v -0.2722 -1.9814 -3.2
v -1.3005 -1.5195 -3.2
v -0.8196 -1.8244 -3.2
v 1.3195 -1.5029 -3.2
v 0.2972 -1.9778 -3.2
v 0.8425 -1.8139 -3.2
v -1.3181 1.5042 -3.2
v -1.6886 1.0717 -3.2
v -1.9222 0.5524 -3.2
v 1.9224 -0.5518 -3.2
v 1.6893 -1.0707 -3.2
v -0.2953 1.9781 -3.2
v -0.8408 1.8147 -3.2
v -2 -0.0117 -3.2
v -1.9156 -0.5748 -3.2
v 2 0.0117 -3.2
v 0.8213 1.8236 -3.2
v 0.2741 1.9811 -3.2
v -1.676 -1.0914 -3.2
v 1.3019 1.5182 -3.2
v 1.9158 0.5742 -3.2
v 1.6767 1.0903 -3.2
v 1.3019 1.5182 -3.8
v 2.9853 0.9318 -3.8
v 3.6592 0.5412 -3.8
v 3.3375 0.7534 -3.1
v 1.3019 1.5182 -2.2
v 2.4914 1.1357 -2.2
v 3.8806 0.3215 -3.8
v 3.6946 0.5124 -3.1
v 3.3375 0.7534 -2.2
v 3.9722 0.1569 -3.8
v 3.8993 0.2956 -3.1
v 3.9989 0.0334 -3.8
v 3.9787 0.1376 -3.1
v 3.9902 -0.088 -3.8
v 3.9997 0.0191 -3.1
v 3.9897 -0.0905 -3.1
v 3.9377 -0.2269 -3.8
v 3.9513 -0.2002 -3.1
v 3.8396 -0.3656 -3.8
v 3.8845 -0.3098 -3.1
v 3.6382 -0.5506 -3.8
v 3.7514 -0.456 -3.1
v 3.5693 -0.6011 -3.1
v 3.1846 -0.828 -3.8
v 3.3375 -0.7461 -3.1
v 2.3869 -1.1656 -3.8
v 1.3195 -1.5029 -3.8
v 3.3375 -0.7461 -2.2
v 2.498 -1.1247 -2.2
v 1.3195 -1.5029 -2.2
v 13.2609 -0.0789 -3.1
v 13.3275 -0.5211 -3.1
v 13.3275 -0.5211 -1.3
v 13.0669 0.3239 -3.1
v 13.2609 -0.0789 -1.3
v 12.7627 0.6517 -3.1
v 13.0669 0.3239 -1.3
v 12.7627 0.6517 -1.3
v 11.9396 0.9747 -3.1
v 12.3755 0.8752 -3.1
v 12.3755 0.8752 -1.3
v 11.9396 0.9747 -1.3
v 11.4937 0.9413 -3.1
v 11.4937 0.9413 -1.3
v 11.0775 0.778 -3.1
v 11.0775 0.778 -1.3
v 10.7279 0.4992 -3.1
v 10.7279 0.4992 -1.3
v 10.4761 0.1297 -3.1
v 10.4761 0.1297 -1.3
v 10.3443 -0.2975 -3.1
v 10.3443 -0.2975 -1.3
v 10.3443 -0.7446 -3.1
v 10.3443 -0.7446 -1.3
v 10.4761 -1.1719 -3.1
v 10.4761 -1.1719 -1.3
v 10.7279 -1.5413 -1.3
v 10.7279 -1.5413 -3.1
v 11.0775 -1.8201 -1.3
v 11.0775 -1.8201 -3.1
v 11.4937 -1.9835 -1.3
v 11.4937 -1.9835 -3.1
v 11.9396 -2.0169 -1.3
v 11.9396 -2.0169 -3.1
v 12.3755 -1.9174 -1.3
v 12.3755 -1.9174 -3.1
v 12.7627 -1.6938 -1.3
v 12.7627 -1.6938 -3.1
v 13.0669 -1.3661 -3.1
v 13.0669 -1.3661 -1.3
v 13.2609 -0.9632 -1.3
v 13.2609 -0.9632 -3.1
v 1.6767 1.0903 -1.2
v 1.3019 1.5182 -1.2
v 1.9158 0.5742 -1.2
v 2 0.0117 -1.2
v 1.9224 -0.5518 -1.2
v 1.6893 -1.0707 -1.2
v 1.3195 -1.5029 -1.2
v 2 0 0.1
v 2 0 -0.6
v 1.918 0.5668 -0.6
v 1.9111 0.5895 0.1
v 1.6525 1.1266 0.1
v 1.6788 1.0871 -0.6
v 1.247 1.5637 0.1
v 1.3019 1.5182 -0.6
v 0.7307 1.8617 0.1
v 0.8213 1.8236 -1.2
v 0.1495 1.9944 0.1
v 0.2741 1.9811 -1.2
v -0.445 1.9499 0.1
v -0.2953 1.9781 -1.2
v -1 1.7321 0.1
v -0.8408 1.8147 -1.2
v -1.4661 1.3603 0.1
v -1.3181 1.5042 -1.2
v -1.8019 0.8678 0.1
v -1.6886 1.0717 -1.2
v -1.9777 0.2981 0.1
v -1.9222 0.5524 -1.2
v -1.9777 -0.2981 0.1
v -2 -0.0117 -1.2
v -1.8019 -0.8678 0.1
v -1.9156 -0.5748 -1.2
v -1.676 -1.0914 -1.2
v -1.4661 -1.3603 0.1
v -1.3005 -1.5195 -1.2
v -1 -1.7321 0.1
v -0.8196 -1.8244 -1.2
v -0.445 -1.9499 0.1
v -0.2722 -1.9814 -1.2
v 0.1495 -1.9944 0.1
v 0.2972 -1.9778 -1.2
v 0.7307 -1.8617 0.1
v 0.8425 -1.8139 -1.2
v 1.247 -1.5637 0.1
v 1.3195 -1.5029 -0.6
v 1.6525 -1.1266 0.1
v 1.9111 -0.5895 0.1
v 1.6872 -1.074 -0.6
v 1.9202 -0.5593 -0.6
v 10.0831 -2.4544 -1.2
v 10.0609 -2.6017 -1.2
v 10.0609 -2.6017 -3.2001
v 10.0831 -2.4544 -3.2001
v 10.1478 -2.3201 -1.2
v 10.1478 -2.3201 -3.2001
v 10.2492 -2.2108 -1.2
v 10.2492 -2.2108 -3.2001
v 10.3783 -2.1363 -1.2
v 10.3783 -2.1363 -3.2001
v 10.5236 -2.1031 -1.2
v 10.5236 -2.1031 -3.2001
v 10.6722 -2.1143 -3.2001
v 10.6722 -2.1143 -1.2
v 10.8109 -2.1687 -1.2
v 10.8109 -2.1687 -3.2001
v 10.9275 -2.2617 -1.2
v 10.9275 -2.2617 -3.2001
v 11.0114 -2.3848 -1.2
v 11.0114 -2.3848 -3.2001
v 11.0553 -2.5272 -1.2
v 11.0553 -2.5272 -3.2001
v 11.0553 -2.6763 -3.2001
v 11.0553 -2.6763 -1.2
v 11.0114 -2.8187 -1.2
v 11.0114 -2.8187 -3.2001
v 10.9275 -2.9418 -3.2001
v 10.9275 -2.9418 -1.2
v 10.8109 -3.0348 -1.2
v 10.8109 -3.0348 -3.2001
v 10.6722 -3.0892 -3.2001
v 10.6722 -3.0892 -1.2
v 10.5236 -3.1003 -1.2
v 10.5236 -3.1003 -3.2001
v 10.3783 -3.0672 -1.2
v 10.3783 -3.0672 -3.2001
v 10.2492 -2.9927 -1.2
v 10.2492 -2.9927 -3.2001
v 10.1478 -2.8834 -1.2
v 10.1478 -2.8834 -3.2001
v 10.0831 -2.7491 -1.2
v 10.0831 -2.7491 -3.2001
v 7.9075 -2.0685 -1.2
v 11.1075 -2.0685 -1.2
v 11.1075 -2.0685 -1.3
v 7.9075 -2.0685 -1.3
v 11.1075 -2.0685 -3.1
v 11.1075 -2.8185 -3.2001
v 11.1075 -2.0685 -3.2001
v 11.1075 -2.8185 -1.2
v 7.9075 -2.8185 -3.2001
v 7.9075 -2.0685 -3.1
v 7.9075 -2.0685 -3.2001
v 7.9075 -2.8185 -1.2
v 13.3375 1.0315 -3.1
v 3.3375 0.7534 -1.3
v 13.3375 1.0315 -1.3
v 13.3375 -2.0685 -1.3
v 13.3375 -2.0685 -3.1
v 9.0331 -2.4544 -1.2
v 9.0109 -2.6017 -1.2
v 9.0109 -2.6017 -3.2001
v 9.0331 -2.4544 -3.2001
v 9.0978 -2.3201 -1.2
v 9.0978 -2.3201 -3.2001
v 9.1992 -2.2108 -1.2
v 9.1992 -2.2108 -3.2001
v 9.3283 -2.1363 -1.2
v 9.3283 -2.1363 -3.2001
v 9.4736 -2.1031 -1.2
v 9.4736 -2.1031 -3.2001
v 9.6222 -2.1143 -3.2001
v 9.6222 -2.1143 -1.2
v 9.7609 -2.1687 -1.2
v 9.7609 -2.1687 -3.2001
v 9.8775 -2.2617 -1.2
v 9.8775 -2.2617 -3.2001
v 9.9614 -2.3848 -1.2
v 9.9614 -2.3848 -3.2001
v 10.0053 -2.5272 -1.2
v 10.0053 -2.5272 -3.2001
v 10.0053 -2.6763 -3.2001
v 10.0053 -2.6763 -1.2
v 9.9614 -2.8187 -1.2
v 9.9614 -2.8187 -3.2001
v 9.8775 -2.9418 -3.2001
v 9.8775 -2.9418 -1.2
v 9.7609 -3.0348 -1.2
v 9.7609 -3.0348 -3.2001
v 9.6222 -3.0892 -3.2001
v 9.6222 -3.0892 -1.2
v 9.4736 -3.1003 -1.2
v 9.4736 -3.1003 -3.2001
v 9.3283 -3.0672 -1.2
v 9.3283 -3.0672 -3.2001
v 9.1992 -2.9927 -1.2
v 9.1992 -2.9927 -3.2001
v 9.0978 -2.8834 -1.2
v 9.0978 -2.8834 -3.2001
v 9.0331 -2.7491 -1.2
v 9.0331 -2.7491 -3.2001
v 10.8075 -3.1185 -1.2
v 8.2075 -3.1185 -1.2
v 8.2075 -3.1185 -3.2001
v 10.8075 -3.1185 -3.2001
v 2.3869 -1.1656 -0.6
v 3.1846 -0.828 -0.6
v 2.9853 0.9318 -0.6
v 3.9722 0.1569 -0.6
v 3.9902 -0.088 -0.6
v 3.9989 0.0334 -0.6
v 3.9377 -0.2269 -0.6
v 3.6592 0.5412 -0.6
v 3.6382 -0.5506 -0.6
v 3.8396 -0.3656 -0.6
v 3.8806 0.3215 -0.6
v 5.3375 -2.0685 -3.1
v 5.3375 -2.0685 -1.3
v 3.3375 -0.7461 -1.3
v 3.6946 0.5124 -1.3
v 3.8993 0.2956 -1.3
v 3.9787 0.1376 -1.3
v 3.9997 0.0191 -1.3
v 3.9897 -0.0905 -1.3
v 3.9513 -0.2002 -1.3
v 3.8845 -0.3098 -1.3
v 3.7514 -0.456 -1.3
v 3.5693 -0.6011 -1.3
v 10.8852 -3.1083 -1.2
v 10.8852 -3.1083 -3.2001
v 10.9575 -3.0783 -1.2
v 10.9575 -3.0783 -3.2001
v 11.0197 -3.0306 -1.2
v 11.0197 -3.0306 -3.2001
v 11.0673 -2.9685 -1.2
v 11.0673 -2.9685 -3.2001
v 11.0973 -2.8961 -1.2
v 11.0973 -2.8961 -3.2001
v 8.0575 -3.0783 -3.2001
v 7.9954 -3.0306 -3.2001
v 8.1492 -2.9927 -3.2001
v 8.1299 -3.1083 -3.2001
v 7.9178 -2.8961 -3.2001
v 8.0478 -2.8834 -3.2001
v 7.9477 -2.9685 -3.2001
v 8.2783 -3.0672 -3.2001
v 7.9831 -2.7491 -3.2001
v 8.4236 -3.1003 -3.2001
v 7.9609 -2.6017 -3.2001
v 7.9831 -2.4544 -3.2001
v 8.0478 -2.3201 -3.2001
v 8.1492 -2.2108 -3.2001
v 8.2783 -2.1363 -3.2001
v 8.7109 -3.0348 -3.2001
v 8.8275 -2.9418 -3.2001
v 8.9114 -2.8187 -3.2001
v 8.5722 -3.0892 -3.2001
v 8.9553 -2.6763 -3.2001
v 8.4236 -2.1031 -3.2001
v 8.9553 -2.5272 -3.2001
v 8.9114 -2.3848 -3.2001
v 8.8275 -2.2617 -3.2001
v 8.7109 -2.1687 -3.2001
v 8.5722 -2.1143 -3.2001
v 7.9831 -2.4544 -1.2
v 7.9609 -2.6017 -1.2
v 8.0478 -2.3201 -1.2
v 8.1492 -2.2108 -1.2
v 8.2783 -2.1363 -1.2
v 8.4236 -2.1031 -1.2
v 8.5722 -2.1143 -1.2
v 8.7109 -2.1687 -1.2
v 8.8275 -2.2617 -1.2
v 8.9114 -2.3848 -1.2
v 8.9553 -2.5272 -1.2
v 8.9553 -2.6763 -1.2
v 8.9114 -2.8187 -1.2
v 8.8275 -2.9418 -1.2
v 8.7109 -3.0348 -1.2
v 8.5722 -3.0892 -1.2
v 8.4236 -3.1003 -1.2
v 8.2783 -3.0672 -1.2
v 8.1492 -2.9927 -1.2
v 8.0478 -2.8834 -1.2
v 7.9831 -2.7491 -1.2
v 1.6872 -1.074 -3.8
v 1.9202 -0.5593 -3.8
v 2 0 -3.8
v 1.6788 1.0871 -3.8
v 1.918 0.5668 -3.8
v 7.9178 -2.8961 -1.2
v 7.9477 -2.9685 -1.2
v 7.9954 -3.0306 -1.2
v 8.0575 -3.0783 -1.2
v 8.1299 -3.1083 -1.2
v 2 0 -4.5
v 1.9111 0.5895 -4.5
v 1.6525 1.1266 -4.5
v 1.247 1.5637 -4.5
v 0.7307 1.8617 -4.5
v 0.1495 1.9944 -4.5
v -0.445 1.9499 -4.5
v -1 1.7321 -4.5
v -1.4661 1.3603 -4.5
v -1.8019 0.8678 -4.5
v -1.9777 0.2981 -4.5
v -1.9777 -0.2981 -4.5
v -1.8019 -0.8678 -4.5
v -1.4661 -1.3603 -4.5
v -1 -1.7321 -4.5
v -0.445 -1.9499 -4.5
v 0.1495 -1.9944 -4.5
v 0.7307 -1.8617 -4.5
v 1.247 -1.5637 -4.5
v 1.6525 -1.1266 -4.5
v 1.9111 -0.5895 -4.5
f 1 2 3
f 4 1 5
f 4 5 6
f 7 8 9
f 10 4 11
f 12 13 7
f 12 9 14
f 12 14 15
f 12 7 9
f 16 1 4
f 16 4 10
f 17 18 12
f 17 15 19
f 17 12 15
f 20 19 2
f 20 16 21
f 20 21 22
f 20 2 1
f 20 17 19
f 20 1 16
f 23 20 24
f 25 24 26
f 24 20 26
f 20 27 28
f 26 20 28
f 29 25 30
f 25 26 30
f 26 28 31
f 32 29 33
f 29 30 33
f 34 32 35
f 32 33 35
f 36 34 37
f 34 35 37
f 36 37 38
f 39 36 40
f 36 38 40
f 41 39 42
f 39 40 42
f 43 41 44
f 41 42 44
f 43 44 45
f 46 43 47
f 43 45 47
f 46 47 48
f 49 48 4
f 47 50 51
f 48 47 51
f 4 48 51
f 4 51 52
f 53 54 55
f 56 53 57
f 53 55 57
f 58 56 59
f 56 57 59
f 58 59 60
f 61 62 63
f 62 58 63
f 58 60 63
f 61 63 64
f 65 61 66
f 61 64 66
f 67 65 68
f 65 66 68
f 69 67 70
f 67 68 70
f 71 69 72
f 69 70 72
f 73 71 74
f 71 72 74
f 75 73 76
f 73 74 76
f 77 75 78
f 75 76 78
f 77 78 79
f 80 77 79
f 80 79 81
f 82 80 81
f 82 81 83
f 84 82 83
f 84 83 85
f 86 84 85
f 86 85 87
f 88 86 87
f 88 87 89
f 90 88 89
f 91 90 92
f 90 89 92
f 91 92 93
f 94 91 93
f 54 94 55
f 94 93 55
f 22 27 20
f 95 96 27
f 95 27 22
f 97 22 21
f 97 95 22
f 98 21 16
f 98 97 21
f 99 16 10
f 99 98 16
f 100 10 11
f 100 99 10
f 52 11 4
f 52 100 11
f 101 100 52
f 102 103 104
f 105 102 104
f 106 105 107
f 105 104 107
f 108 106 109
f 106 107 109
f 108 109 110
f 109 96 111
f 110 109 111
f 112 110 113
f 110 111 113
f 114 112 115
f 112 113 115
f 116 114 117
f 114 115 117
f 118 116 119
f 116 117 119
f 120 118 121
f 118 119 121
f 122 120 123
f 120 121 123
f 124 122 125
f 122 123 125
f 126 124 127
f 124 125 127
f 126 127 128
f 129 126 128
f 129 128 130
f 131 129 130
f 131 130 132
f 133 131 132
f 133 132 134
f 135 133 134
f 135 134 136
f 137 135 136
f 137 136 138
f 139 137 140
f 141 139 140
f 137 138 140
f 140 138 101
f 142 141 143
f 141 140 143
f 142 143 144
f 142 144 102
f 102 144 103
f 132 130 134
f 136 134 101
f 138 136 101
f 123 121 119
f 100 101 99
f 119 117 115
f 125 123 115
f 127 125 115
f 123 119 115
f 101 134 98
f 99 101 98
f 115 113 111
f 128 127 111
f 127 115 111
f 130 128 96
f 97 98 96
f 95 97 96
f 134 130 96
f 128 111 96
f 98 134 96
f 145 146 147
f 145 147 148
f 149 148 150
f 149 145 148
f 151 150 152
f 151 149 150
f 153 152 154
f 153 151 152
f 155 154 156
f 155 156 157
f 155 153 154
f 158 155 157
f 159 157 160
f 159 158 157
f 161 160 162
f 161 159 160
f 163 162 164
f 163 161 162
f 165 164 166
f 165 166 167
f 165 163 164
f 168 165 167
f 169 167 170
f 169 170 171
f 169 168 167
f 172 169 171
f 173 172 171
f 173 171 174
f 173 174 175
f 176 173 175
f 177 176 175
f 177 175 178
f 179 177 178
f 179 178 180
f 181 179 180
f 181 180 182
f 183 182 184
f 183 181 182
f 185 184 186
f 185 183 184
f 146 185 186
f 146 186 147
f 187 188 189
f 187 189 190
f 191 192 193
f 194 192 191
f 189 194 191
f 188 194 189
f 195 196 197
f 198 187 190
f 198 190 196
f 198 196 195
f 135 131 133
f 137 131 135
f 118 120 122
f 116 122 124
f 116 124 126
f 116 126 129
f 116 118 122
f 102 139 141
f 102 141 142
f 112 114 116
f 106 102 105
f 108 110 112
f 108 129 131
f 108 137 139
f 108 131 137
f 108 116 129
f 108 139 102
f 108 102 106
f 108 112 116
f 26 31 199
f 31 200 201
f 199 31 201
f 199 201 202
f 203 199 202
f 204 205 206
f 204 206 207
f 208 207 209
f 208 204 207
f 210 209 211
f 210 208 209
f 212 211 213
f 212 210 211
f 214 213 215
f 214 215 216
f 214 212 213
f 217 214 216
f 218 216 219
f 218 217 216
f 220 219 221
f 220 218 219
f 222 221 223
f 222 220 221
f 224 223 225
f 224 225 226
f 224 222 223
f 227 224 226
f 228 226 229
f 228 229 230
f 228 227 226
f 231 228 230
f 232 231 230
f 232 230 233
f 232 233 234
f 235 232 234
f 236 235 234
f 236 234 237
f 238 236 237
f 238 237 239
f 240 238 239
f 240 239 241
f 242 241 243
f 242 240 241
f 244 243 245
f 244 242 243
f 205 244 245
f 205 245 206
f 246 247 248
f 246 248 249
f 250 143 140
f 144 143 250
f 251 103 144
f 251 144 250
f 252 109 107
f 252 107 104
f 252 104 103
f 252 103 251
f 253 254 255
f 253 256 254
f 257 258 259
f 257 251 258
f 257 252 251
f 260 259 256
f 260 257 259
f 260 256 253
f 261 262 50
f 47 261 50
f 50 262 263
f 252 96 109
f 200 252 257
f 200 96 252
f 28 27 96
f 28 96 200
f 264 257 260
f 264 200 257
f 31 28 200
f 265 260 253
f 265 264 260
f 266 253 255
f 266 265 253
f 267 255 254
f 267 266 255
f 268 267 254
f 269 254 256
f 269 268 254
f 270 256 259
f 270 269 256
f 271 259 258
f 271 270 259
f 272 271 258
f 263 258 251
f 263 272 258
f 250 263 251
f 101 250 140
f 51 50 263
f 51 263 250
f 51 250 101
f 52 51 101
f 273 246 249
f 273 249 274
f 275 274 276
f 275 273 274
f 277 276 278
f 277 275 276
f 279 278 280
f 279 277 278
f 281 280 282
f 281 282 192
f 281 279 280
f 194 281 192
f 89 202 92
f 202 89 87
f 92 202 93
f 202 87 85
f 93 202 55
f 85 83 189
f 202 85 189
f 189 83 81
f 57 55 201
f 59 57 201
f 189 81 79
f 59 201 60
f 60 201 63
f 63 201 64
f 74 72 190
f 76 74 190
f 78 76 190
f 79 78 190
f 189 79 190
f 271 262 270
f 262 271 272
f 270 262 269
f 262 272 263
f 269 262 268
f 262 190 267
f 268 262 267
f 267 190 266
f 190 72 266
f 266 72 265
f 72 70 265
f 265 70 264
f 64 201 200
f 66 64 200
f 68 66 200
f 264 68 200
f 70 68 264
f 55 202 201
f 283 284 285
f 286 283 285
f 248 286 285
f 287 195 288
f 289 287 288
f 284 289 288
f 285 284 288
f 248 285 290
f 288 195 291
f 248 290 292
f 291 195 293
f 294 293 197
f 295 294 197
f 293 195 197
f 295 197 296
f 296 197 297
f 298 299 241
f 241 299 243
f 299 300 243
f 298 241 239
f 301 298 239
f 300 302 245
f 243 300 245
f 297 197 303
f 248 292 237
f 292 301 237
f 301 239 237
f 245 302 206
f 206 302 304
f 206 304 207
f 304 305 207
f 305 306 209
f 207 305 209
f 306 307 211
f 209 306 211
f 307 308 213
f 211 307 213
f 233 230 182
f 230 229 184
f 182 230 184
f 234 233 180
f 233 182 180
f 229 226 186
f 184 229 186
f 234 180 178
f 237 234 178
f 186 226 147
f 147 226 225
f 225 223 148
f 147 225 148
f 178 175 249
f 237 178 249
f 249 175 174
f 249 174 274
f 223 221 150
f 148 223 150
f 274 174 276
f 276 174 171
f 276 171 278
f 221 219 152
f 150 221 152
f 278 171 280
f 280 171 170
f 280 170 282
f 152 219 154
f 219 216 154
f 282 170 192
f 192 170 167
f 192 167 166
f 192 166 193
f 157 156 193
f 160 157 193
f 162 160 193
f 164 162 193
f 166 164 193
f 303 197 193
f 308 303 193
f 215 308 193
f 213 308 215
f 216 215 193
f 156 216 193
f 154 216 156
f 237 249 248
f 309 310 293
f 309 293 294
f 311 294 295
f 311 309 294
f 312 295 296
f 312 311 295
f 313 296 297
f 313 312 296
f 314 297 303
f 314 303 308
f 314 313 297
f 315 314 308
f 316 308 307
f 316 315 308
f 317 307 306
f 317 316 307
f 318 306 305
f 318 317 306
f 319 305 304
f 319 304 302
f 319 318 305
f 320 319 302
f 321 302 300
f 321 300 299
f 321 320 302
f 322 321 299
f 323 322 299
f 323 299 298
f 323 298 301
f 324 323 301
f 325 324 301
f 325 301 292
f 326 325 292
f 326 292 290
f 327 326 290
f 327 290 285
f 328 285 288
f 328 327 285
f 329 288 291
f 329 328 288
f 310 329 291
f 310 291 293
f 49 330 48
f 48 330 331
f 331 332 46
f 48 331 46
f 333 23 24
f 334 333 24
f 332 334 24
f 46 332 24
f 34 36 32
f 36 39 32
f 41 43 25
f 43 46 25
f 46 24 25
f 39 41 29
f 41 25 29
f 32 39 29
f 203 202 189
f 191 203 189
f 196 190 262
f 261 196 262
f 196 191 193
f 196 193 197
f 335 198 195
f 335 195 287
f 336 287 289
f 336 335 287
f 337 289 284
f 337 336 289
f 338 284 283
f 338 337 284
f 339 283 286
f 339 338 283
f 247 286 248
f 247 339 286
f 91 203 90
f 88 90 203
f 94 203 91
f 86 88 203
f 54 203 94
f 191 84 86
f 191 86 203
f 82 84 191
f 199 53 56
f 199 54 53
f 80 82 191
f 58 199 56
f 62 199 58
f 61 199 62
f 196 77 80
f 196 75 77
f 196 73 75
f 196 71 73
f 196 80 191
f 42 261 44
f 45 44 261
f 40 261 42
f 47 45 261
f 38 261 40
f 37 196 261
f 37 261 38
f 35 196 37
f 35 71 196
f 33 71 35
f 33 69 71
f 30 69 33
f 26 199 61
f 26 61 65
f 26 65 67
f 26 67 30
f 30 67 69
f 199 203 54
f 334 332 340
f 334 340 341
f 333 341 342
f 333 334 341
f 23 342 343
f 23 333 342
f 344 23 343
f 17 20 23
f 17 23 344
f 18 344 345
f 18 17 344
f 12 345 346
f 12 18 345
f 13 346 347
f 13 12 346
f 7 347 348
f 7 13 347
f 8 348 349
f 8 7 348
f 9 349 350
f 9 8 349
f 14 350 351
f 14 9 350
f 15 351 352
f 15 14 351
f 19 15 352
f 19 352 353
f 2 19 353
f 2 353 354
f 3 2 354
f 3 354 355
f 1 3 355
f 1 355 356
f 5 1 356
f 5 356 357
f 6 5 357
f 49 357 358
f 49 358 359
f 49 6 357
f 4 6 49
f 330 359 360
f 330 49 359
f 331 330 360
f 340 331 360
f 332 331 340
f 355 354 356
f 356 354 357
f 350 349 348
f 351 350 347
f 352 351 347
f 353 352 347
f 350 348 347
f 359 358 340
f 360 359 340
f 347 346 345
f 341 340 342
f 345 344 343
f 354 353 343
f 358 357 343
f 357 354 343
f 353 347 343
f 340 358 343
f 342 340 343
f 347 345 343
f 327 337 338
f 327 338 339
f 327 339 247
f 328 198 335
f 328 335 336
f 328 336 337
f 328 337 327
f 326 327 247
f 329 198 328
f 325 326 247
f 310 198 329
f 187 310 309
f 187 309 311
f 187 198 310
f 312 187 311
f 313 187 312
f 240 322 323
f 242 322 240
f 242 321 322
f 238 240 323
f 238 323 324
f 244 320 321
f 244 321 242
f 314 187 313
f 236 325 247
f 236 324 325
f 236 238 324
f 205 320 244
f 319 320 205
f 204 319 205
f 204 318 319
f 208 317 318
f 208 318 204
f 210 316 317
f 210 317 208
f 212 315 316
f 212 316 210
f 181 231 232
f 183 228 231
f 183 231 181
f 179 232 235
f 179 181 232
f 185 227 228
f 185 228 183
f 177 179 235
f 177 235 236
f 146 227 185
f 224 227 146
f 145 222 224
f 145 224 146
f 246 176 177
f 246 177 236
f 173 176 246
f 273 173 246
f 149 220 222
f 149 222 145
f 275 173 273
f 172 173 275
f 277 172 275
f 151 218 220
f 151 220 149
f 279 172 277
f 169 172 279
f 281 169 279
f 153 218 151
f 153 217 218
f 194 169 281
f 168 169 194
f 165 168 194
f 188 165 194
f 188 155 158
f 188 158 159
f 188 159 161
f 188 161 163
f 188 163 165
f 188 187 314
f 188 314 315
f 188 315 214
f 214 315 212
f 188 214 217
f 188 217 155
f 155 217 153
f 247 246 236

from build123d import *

# Parameters (mm, degrees)
BOSS_EXTRUDE1_START      = -1.2
SKETCH1_R                = 2
BOSS_EXTRUDE1_DEPTH      = 1.3
BOSS_EXTRUDE2_START      = 1
BOSS_EXTRUDE2_DEPTH      = 1.6
BOSS_EXTRUDE3_DEPTH      = 0.9
SKETCH6_R                = 1.5
CUT_EXTRUDE13_DEPTH      = 2.5
BOSS_EXTRUDE4_DEPTH      = 0.0001
BOSS_EXTRUDE4_DEPTH_BACK = 2
SKETCH9_R                = 0.5


with BuildPart() as part:
    # Sketch1 → Boss-Extrude1 (new body)
    with BuildSketch(Plane.XY.offset(BOSS_EXTRUDE1_START)):
        Circle(SKETCH1_R)
    boss_extrude1 = extrude(amount=BOSS_EXTRUDE1_DEPTH)

    # Sketch2 → Boss-Extrude2 (add)
    with BuildSketch(Plane(origin=(0, 0, -1.2), x_dir=(-1, 0, 0), z_dir=(0, 0, -1)).offset(BOSS_EXTRUDE2_START)):
        with BuildLine():
            ThreePointArc((-1.301905334, 1.518236642), (-1.999965901, 0.011678742), (-1.31954734, -1.502928747))
            add(Edge.make_bspline(
                [(-1.301905334, 1.518236642), (-6.689282212, 0.003550345), (-1.31954734, -1.502928747)],
                knots=[0, 0, 0, 1, 1, 1], degree=2))
        make_face()
    boss_extrude2 = extrude(amount=-BOSS_EXTRUDE2_DEPTH)

    # Sketch3 → Boss-Extrude3 (add)
    with BuildSketch(Plane(origin=(0, 0, -2.2), x_dir=(-1, 0, 0), z_dir=(0, 0, -1))):
        with BuildLine():
            Line((-5.337512996, -2.068499627), (-3.337513, -0.746121009))
            add(Edge.make_bspline(
                [(-3.337512996, 0.753381422), (-4.662510017, 0.002619292), (-3.337513, -0.746121009)],
                knots=[0.252652683, 0.252652683, 0.252652683, 0.748987348, 0.748987348, 0.748987348], degree=2))
            Line((-3.337513, 0.753381429), (-13.337512996, 1.031500373))
            Line((-13.337512996, 1.031500373), (-13.337512996, -2.068499627))
            Line((-13.337512996, -2.068499627), (-5.337512996, -2.068499627))
        make_face()
    boss_extrude3 = extrude(amount=-BOSS_EXTRUDE3_DEPTH)

    # Sketch6 → Cut-Extrude13 (cut, symmetric)
    with BuildSketch(Plane.XY.offset(-1.3)):
        with Locations((11.827512996, -0.521079469)):
            Circle(SKETCH6_R)
    cut_extrude13 = extrude(amount=CUT_EXTRUDE13_DEPTH, both=True, mode=Mode.SUBTRACT)

    # Mirror2: Boss-Extrude2, Boss-Extrude3 across plane
    add(boss_extrude2.mirror(Plane(origin=(0, 0, -2.2), x_dir=(1, 0, 0), z_dir=(0, 0, -1))))
    add(boss_extrude3.mirror(Plane(origin=(0, 0, -2.2), x_dir=(1, 0, 0), z_dir=(0, 0, -1))))

    # Mirror3: Boss-Extrude1 across plane
    add(boss_extrude1.mirror(Plane(origin=(0, 0, -2.2), x_dir=(1, 0, 0), z_dir=(0, 0, -1))))

    # Mirror4: Cut-Extrude13 across plane
    add(cut_extrude13.mirror(Plane(origin=(0, 0, -2.2), x_dir=(1, 0, 0), z_dir=(0, 0, -1))), mode=Mode.SUBTRACT)

    # Sketch9 → Boss-Extrude4 (add, two sides: drawn at the far end of the back side and taken through both)
    with BuildSketch(Plane(origin=(0, 0, -3.2), x_dir=(-1, 0, 0), z_dir=(0, 0, -1)).offset(-BOSS_EXTRUDE4_DEPTH_BACK)):
        with BuildLine():
            Line((-11.107531907, -2.068499627), (-7.907531907, -2.068499627))
            Line((-7.907531907, -2.068499627), (-7.907531907, -2.818499627))
            ThreePointArc((-7.907531907, -2.818499627), (-7.995399873, -3.030631662), (-8.207531907, -3.118499627))
            Line((-8.207531907, -3.118499627), (-10.807531907, -3.118499627))
            ThreePointArc((-10.807531907, -3.118499627), (-11.019663942, -3.030631662), (-11.107531907, -2.818499627))
            Line((-11.107531907, -2.818499627), (-11.107531907, -2.068499627))
        make_face()
        with Locations((-10.560929332, -2.601747045)):
            Circle(SKETCH9_R, mode=Mode.SUBTRACT)
        with Locations((-9.510929332, -2.601747045)):
            Circle(SKETCH9_R, mode=Mode.SUBTRACT)
        with Locations((-8.460929332, -2.601747045)):
            Circle(SKETCH9_R, mode=Mode.SUBTRACT)
    extrude(amount=BOSS_EXTRUDE4_DEPTH + BOSS_EXTRUDE4_DEPTH_BACK)


solid = part.part
